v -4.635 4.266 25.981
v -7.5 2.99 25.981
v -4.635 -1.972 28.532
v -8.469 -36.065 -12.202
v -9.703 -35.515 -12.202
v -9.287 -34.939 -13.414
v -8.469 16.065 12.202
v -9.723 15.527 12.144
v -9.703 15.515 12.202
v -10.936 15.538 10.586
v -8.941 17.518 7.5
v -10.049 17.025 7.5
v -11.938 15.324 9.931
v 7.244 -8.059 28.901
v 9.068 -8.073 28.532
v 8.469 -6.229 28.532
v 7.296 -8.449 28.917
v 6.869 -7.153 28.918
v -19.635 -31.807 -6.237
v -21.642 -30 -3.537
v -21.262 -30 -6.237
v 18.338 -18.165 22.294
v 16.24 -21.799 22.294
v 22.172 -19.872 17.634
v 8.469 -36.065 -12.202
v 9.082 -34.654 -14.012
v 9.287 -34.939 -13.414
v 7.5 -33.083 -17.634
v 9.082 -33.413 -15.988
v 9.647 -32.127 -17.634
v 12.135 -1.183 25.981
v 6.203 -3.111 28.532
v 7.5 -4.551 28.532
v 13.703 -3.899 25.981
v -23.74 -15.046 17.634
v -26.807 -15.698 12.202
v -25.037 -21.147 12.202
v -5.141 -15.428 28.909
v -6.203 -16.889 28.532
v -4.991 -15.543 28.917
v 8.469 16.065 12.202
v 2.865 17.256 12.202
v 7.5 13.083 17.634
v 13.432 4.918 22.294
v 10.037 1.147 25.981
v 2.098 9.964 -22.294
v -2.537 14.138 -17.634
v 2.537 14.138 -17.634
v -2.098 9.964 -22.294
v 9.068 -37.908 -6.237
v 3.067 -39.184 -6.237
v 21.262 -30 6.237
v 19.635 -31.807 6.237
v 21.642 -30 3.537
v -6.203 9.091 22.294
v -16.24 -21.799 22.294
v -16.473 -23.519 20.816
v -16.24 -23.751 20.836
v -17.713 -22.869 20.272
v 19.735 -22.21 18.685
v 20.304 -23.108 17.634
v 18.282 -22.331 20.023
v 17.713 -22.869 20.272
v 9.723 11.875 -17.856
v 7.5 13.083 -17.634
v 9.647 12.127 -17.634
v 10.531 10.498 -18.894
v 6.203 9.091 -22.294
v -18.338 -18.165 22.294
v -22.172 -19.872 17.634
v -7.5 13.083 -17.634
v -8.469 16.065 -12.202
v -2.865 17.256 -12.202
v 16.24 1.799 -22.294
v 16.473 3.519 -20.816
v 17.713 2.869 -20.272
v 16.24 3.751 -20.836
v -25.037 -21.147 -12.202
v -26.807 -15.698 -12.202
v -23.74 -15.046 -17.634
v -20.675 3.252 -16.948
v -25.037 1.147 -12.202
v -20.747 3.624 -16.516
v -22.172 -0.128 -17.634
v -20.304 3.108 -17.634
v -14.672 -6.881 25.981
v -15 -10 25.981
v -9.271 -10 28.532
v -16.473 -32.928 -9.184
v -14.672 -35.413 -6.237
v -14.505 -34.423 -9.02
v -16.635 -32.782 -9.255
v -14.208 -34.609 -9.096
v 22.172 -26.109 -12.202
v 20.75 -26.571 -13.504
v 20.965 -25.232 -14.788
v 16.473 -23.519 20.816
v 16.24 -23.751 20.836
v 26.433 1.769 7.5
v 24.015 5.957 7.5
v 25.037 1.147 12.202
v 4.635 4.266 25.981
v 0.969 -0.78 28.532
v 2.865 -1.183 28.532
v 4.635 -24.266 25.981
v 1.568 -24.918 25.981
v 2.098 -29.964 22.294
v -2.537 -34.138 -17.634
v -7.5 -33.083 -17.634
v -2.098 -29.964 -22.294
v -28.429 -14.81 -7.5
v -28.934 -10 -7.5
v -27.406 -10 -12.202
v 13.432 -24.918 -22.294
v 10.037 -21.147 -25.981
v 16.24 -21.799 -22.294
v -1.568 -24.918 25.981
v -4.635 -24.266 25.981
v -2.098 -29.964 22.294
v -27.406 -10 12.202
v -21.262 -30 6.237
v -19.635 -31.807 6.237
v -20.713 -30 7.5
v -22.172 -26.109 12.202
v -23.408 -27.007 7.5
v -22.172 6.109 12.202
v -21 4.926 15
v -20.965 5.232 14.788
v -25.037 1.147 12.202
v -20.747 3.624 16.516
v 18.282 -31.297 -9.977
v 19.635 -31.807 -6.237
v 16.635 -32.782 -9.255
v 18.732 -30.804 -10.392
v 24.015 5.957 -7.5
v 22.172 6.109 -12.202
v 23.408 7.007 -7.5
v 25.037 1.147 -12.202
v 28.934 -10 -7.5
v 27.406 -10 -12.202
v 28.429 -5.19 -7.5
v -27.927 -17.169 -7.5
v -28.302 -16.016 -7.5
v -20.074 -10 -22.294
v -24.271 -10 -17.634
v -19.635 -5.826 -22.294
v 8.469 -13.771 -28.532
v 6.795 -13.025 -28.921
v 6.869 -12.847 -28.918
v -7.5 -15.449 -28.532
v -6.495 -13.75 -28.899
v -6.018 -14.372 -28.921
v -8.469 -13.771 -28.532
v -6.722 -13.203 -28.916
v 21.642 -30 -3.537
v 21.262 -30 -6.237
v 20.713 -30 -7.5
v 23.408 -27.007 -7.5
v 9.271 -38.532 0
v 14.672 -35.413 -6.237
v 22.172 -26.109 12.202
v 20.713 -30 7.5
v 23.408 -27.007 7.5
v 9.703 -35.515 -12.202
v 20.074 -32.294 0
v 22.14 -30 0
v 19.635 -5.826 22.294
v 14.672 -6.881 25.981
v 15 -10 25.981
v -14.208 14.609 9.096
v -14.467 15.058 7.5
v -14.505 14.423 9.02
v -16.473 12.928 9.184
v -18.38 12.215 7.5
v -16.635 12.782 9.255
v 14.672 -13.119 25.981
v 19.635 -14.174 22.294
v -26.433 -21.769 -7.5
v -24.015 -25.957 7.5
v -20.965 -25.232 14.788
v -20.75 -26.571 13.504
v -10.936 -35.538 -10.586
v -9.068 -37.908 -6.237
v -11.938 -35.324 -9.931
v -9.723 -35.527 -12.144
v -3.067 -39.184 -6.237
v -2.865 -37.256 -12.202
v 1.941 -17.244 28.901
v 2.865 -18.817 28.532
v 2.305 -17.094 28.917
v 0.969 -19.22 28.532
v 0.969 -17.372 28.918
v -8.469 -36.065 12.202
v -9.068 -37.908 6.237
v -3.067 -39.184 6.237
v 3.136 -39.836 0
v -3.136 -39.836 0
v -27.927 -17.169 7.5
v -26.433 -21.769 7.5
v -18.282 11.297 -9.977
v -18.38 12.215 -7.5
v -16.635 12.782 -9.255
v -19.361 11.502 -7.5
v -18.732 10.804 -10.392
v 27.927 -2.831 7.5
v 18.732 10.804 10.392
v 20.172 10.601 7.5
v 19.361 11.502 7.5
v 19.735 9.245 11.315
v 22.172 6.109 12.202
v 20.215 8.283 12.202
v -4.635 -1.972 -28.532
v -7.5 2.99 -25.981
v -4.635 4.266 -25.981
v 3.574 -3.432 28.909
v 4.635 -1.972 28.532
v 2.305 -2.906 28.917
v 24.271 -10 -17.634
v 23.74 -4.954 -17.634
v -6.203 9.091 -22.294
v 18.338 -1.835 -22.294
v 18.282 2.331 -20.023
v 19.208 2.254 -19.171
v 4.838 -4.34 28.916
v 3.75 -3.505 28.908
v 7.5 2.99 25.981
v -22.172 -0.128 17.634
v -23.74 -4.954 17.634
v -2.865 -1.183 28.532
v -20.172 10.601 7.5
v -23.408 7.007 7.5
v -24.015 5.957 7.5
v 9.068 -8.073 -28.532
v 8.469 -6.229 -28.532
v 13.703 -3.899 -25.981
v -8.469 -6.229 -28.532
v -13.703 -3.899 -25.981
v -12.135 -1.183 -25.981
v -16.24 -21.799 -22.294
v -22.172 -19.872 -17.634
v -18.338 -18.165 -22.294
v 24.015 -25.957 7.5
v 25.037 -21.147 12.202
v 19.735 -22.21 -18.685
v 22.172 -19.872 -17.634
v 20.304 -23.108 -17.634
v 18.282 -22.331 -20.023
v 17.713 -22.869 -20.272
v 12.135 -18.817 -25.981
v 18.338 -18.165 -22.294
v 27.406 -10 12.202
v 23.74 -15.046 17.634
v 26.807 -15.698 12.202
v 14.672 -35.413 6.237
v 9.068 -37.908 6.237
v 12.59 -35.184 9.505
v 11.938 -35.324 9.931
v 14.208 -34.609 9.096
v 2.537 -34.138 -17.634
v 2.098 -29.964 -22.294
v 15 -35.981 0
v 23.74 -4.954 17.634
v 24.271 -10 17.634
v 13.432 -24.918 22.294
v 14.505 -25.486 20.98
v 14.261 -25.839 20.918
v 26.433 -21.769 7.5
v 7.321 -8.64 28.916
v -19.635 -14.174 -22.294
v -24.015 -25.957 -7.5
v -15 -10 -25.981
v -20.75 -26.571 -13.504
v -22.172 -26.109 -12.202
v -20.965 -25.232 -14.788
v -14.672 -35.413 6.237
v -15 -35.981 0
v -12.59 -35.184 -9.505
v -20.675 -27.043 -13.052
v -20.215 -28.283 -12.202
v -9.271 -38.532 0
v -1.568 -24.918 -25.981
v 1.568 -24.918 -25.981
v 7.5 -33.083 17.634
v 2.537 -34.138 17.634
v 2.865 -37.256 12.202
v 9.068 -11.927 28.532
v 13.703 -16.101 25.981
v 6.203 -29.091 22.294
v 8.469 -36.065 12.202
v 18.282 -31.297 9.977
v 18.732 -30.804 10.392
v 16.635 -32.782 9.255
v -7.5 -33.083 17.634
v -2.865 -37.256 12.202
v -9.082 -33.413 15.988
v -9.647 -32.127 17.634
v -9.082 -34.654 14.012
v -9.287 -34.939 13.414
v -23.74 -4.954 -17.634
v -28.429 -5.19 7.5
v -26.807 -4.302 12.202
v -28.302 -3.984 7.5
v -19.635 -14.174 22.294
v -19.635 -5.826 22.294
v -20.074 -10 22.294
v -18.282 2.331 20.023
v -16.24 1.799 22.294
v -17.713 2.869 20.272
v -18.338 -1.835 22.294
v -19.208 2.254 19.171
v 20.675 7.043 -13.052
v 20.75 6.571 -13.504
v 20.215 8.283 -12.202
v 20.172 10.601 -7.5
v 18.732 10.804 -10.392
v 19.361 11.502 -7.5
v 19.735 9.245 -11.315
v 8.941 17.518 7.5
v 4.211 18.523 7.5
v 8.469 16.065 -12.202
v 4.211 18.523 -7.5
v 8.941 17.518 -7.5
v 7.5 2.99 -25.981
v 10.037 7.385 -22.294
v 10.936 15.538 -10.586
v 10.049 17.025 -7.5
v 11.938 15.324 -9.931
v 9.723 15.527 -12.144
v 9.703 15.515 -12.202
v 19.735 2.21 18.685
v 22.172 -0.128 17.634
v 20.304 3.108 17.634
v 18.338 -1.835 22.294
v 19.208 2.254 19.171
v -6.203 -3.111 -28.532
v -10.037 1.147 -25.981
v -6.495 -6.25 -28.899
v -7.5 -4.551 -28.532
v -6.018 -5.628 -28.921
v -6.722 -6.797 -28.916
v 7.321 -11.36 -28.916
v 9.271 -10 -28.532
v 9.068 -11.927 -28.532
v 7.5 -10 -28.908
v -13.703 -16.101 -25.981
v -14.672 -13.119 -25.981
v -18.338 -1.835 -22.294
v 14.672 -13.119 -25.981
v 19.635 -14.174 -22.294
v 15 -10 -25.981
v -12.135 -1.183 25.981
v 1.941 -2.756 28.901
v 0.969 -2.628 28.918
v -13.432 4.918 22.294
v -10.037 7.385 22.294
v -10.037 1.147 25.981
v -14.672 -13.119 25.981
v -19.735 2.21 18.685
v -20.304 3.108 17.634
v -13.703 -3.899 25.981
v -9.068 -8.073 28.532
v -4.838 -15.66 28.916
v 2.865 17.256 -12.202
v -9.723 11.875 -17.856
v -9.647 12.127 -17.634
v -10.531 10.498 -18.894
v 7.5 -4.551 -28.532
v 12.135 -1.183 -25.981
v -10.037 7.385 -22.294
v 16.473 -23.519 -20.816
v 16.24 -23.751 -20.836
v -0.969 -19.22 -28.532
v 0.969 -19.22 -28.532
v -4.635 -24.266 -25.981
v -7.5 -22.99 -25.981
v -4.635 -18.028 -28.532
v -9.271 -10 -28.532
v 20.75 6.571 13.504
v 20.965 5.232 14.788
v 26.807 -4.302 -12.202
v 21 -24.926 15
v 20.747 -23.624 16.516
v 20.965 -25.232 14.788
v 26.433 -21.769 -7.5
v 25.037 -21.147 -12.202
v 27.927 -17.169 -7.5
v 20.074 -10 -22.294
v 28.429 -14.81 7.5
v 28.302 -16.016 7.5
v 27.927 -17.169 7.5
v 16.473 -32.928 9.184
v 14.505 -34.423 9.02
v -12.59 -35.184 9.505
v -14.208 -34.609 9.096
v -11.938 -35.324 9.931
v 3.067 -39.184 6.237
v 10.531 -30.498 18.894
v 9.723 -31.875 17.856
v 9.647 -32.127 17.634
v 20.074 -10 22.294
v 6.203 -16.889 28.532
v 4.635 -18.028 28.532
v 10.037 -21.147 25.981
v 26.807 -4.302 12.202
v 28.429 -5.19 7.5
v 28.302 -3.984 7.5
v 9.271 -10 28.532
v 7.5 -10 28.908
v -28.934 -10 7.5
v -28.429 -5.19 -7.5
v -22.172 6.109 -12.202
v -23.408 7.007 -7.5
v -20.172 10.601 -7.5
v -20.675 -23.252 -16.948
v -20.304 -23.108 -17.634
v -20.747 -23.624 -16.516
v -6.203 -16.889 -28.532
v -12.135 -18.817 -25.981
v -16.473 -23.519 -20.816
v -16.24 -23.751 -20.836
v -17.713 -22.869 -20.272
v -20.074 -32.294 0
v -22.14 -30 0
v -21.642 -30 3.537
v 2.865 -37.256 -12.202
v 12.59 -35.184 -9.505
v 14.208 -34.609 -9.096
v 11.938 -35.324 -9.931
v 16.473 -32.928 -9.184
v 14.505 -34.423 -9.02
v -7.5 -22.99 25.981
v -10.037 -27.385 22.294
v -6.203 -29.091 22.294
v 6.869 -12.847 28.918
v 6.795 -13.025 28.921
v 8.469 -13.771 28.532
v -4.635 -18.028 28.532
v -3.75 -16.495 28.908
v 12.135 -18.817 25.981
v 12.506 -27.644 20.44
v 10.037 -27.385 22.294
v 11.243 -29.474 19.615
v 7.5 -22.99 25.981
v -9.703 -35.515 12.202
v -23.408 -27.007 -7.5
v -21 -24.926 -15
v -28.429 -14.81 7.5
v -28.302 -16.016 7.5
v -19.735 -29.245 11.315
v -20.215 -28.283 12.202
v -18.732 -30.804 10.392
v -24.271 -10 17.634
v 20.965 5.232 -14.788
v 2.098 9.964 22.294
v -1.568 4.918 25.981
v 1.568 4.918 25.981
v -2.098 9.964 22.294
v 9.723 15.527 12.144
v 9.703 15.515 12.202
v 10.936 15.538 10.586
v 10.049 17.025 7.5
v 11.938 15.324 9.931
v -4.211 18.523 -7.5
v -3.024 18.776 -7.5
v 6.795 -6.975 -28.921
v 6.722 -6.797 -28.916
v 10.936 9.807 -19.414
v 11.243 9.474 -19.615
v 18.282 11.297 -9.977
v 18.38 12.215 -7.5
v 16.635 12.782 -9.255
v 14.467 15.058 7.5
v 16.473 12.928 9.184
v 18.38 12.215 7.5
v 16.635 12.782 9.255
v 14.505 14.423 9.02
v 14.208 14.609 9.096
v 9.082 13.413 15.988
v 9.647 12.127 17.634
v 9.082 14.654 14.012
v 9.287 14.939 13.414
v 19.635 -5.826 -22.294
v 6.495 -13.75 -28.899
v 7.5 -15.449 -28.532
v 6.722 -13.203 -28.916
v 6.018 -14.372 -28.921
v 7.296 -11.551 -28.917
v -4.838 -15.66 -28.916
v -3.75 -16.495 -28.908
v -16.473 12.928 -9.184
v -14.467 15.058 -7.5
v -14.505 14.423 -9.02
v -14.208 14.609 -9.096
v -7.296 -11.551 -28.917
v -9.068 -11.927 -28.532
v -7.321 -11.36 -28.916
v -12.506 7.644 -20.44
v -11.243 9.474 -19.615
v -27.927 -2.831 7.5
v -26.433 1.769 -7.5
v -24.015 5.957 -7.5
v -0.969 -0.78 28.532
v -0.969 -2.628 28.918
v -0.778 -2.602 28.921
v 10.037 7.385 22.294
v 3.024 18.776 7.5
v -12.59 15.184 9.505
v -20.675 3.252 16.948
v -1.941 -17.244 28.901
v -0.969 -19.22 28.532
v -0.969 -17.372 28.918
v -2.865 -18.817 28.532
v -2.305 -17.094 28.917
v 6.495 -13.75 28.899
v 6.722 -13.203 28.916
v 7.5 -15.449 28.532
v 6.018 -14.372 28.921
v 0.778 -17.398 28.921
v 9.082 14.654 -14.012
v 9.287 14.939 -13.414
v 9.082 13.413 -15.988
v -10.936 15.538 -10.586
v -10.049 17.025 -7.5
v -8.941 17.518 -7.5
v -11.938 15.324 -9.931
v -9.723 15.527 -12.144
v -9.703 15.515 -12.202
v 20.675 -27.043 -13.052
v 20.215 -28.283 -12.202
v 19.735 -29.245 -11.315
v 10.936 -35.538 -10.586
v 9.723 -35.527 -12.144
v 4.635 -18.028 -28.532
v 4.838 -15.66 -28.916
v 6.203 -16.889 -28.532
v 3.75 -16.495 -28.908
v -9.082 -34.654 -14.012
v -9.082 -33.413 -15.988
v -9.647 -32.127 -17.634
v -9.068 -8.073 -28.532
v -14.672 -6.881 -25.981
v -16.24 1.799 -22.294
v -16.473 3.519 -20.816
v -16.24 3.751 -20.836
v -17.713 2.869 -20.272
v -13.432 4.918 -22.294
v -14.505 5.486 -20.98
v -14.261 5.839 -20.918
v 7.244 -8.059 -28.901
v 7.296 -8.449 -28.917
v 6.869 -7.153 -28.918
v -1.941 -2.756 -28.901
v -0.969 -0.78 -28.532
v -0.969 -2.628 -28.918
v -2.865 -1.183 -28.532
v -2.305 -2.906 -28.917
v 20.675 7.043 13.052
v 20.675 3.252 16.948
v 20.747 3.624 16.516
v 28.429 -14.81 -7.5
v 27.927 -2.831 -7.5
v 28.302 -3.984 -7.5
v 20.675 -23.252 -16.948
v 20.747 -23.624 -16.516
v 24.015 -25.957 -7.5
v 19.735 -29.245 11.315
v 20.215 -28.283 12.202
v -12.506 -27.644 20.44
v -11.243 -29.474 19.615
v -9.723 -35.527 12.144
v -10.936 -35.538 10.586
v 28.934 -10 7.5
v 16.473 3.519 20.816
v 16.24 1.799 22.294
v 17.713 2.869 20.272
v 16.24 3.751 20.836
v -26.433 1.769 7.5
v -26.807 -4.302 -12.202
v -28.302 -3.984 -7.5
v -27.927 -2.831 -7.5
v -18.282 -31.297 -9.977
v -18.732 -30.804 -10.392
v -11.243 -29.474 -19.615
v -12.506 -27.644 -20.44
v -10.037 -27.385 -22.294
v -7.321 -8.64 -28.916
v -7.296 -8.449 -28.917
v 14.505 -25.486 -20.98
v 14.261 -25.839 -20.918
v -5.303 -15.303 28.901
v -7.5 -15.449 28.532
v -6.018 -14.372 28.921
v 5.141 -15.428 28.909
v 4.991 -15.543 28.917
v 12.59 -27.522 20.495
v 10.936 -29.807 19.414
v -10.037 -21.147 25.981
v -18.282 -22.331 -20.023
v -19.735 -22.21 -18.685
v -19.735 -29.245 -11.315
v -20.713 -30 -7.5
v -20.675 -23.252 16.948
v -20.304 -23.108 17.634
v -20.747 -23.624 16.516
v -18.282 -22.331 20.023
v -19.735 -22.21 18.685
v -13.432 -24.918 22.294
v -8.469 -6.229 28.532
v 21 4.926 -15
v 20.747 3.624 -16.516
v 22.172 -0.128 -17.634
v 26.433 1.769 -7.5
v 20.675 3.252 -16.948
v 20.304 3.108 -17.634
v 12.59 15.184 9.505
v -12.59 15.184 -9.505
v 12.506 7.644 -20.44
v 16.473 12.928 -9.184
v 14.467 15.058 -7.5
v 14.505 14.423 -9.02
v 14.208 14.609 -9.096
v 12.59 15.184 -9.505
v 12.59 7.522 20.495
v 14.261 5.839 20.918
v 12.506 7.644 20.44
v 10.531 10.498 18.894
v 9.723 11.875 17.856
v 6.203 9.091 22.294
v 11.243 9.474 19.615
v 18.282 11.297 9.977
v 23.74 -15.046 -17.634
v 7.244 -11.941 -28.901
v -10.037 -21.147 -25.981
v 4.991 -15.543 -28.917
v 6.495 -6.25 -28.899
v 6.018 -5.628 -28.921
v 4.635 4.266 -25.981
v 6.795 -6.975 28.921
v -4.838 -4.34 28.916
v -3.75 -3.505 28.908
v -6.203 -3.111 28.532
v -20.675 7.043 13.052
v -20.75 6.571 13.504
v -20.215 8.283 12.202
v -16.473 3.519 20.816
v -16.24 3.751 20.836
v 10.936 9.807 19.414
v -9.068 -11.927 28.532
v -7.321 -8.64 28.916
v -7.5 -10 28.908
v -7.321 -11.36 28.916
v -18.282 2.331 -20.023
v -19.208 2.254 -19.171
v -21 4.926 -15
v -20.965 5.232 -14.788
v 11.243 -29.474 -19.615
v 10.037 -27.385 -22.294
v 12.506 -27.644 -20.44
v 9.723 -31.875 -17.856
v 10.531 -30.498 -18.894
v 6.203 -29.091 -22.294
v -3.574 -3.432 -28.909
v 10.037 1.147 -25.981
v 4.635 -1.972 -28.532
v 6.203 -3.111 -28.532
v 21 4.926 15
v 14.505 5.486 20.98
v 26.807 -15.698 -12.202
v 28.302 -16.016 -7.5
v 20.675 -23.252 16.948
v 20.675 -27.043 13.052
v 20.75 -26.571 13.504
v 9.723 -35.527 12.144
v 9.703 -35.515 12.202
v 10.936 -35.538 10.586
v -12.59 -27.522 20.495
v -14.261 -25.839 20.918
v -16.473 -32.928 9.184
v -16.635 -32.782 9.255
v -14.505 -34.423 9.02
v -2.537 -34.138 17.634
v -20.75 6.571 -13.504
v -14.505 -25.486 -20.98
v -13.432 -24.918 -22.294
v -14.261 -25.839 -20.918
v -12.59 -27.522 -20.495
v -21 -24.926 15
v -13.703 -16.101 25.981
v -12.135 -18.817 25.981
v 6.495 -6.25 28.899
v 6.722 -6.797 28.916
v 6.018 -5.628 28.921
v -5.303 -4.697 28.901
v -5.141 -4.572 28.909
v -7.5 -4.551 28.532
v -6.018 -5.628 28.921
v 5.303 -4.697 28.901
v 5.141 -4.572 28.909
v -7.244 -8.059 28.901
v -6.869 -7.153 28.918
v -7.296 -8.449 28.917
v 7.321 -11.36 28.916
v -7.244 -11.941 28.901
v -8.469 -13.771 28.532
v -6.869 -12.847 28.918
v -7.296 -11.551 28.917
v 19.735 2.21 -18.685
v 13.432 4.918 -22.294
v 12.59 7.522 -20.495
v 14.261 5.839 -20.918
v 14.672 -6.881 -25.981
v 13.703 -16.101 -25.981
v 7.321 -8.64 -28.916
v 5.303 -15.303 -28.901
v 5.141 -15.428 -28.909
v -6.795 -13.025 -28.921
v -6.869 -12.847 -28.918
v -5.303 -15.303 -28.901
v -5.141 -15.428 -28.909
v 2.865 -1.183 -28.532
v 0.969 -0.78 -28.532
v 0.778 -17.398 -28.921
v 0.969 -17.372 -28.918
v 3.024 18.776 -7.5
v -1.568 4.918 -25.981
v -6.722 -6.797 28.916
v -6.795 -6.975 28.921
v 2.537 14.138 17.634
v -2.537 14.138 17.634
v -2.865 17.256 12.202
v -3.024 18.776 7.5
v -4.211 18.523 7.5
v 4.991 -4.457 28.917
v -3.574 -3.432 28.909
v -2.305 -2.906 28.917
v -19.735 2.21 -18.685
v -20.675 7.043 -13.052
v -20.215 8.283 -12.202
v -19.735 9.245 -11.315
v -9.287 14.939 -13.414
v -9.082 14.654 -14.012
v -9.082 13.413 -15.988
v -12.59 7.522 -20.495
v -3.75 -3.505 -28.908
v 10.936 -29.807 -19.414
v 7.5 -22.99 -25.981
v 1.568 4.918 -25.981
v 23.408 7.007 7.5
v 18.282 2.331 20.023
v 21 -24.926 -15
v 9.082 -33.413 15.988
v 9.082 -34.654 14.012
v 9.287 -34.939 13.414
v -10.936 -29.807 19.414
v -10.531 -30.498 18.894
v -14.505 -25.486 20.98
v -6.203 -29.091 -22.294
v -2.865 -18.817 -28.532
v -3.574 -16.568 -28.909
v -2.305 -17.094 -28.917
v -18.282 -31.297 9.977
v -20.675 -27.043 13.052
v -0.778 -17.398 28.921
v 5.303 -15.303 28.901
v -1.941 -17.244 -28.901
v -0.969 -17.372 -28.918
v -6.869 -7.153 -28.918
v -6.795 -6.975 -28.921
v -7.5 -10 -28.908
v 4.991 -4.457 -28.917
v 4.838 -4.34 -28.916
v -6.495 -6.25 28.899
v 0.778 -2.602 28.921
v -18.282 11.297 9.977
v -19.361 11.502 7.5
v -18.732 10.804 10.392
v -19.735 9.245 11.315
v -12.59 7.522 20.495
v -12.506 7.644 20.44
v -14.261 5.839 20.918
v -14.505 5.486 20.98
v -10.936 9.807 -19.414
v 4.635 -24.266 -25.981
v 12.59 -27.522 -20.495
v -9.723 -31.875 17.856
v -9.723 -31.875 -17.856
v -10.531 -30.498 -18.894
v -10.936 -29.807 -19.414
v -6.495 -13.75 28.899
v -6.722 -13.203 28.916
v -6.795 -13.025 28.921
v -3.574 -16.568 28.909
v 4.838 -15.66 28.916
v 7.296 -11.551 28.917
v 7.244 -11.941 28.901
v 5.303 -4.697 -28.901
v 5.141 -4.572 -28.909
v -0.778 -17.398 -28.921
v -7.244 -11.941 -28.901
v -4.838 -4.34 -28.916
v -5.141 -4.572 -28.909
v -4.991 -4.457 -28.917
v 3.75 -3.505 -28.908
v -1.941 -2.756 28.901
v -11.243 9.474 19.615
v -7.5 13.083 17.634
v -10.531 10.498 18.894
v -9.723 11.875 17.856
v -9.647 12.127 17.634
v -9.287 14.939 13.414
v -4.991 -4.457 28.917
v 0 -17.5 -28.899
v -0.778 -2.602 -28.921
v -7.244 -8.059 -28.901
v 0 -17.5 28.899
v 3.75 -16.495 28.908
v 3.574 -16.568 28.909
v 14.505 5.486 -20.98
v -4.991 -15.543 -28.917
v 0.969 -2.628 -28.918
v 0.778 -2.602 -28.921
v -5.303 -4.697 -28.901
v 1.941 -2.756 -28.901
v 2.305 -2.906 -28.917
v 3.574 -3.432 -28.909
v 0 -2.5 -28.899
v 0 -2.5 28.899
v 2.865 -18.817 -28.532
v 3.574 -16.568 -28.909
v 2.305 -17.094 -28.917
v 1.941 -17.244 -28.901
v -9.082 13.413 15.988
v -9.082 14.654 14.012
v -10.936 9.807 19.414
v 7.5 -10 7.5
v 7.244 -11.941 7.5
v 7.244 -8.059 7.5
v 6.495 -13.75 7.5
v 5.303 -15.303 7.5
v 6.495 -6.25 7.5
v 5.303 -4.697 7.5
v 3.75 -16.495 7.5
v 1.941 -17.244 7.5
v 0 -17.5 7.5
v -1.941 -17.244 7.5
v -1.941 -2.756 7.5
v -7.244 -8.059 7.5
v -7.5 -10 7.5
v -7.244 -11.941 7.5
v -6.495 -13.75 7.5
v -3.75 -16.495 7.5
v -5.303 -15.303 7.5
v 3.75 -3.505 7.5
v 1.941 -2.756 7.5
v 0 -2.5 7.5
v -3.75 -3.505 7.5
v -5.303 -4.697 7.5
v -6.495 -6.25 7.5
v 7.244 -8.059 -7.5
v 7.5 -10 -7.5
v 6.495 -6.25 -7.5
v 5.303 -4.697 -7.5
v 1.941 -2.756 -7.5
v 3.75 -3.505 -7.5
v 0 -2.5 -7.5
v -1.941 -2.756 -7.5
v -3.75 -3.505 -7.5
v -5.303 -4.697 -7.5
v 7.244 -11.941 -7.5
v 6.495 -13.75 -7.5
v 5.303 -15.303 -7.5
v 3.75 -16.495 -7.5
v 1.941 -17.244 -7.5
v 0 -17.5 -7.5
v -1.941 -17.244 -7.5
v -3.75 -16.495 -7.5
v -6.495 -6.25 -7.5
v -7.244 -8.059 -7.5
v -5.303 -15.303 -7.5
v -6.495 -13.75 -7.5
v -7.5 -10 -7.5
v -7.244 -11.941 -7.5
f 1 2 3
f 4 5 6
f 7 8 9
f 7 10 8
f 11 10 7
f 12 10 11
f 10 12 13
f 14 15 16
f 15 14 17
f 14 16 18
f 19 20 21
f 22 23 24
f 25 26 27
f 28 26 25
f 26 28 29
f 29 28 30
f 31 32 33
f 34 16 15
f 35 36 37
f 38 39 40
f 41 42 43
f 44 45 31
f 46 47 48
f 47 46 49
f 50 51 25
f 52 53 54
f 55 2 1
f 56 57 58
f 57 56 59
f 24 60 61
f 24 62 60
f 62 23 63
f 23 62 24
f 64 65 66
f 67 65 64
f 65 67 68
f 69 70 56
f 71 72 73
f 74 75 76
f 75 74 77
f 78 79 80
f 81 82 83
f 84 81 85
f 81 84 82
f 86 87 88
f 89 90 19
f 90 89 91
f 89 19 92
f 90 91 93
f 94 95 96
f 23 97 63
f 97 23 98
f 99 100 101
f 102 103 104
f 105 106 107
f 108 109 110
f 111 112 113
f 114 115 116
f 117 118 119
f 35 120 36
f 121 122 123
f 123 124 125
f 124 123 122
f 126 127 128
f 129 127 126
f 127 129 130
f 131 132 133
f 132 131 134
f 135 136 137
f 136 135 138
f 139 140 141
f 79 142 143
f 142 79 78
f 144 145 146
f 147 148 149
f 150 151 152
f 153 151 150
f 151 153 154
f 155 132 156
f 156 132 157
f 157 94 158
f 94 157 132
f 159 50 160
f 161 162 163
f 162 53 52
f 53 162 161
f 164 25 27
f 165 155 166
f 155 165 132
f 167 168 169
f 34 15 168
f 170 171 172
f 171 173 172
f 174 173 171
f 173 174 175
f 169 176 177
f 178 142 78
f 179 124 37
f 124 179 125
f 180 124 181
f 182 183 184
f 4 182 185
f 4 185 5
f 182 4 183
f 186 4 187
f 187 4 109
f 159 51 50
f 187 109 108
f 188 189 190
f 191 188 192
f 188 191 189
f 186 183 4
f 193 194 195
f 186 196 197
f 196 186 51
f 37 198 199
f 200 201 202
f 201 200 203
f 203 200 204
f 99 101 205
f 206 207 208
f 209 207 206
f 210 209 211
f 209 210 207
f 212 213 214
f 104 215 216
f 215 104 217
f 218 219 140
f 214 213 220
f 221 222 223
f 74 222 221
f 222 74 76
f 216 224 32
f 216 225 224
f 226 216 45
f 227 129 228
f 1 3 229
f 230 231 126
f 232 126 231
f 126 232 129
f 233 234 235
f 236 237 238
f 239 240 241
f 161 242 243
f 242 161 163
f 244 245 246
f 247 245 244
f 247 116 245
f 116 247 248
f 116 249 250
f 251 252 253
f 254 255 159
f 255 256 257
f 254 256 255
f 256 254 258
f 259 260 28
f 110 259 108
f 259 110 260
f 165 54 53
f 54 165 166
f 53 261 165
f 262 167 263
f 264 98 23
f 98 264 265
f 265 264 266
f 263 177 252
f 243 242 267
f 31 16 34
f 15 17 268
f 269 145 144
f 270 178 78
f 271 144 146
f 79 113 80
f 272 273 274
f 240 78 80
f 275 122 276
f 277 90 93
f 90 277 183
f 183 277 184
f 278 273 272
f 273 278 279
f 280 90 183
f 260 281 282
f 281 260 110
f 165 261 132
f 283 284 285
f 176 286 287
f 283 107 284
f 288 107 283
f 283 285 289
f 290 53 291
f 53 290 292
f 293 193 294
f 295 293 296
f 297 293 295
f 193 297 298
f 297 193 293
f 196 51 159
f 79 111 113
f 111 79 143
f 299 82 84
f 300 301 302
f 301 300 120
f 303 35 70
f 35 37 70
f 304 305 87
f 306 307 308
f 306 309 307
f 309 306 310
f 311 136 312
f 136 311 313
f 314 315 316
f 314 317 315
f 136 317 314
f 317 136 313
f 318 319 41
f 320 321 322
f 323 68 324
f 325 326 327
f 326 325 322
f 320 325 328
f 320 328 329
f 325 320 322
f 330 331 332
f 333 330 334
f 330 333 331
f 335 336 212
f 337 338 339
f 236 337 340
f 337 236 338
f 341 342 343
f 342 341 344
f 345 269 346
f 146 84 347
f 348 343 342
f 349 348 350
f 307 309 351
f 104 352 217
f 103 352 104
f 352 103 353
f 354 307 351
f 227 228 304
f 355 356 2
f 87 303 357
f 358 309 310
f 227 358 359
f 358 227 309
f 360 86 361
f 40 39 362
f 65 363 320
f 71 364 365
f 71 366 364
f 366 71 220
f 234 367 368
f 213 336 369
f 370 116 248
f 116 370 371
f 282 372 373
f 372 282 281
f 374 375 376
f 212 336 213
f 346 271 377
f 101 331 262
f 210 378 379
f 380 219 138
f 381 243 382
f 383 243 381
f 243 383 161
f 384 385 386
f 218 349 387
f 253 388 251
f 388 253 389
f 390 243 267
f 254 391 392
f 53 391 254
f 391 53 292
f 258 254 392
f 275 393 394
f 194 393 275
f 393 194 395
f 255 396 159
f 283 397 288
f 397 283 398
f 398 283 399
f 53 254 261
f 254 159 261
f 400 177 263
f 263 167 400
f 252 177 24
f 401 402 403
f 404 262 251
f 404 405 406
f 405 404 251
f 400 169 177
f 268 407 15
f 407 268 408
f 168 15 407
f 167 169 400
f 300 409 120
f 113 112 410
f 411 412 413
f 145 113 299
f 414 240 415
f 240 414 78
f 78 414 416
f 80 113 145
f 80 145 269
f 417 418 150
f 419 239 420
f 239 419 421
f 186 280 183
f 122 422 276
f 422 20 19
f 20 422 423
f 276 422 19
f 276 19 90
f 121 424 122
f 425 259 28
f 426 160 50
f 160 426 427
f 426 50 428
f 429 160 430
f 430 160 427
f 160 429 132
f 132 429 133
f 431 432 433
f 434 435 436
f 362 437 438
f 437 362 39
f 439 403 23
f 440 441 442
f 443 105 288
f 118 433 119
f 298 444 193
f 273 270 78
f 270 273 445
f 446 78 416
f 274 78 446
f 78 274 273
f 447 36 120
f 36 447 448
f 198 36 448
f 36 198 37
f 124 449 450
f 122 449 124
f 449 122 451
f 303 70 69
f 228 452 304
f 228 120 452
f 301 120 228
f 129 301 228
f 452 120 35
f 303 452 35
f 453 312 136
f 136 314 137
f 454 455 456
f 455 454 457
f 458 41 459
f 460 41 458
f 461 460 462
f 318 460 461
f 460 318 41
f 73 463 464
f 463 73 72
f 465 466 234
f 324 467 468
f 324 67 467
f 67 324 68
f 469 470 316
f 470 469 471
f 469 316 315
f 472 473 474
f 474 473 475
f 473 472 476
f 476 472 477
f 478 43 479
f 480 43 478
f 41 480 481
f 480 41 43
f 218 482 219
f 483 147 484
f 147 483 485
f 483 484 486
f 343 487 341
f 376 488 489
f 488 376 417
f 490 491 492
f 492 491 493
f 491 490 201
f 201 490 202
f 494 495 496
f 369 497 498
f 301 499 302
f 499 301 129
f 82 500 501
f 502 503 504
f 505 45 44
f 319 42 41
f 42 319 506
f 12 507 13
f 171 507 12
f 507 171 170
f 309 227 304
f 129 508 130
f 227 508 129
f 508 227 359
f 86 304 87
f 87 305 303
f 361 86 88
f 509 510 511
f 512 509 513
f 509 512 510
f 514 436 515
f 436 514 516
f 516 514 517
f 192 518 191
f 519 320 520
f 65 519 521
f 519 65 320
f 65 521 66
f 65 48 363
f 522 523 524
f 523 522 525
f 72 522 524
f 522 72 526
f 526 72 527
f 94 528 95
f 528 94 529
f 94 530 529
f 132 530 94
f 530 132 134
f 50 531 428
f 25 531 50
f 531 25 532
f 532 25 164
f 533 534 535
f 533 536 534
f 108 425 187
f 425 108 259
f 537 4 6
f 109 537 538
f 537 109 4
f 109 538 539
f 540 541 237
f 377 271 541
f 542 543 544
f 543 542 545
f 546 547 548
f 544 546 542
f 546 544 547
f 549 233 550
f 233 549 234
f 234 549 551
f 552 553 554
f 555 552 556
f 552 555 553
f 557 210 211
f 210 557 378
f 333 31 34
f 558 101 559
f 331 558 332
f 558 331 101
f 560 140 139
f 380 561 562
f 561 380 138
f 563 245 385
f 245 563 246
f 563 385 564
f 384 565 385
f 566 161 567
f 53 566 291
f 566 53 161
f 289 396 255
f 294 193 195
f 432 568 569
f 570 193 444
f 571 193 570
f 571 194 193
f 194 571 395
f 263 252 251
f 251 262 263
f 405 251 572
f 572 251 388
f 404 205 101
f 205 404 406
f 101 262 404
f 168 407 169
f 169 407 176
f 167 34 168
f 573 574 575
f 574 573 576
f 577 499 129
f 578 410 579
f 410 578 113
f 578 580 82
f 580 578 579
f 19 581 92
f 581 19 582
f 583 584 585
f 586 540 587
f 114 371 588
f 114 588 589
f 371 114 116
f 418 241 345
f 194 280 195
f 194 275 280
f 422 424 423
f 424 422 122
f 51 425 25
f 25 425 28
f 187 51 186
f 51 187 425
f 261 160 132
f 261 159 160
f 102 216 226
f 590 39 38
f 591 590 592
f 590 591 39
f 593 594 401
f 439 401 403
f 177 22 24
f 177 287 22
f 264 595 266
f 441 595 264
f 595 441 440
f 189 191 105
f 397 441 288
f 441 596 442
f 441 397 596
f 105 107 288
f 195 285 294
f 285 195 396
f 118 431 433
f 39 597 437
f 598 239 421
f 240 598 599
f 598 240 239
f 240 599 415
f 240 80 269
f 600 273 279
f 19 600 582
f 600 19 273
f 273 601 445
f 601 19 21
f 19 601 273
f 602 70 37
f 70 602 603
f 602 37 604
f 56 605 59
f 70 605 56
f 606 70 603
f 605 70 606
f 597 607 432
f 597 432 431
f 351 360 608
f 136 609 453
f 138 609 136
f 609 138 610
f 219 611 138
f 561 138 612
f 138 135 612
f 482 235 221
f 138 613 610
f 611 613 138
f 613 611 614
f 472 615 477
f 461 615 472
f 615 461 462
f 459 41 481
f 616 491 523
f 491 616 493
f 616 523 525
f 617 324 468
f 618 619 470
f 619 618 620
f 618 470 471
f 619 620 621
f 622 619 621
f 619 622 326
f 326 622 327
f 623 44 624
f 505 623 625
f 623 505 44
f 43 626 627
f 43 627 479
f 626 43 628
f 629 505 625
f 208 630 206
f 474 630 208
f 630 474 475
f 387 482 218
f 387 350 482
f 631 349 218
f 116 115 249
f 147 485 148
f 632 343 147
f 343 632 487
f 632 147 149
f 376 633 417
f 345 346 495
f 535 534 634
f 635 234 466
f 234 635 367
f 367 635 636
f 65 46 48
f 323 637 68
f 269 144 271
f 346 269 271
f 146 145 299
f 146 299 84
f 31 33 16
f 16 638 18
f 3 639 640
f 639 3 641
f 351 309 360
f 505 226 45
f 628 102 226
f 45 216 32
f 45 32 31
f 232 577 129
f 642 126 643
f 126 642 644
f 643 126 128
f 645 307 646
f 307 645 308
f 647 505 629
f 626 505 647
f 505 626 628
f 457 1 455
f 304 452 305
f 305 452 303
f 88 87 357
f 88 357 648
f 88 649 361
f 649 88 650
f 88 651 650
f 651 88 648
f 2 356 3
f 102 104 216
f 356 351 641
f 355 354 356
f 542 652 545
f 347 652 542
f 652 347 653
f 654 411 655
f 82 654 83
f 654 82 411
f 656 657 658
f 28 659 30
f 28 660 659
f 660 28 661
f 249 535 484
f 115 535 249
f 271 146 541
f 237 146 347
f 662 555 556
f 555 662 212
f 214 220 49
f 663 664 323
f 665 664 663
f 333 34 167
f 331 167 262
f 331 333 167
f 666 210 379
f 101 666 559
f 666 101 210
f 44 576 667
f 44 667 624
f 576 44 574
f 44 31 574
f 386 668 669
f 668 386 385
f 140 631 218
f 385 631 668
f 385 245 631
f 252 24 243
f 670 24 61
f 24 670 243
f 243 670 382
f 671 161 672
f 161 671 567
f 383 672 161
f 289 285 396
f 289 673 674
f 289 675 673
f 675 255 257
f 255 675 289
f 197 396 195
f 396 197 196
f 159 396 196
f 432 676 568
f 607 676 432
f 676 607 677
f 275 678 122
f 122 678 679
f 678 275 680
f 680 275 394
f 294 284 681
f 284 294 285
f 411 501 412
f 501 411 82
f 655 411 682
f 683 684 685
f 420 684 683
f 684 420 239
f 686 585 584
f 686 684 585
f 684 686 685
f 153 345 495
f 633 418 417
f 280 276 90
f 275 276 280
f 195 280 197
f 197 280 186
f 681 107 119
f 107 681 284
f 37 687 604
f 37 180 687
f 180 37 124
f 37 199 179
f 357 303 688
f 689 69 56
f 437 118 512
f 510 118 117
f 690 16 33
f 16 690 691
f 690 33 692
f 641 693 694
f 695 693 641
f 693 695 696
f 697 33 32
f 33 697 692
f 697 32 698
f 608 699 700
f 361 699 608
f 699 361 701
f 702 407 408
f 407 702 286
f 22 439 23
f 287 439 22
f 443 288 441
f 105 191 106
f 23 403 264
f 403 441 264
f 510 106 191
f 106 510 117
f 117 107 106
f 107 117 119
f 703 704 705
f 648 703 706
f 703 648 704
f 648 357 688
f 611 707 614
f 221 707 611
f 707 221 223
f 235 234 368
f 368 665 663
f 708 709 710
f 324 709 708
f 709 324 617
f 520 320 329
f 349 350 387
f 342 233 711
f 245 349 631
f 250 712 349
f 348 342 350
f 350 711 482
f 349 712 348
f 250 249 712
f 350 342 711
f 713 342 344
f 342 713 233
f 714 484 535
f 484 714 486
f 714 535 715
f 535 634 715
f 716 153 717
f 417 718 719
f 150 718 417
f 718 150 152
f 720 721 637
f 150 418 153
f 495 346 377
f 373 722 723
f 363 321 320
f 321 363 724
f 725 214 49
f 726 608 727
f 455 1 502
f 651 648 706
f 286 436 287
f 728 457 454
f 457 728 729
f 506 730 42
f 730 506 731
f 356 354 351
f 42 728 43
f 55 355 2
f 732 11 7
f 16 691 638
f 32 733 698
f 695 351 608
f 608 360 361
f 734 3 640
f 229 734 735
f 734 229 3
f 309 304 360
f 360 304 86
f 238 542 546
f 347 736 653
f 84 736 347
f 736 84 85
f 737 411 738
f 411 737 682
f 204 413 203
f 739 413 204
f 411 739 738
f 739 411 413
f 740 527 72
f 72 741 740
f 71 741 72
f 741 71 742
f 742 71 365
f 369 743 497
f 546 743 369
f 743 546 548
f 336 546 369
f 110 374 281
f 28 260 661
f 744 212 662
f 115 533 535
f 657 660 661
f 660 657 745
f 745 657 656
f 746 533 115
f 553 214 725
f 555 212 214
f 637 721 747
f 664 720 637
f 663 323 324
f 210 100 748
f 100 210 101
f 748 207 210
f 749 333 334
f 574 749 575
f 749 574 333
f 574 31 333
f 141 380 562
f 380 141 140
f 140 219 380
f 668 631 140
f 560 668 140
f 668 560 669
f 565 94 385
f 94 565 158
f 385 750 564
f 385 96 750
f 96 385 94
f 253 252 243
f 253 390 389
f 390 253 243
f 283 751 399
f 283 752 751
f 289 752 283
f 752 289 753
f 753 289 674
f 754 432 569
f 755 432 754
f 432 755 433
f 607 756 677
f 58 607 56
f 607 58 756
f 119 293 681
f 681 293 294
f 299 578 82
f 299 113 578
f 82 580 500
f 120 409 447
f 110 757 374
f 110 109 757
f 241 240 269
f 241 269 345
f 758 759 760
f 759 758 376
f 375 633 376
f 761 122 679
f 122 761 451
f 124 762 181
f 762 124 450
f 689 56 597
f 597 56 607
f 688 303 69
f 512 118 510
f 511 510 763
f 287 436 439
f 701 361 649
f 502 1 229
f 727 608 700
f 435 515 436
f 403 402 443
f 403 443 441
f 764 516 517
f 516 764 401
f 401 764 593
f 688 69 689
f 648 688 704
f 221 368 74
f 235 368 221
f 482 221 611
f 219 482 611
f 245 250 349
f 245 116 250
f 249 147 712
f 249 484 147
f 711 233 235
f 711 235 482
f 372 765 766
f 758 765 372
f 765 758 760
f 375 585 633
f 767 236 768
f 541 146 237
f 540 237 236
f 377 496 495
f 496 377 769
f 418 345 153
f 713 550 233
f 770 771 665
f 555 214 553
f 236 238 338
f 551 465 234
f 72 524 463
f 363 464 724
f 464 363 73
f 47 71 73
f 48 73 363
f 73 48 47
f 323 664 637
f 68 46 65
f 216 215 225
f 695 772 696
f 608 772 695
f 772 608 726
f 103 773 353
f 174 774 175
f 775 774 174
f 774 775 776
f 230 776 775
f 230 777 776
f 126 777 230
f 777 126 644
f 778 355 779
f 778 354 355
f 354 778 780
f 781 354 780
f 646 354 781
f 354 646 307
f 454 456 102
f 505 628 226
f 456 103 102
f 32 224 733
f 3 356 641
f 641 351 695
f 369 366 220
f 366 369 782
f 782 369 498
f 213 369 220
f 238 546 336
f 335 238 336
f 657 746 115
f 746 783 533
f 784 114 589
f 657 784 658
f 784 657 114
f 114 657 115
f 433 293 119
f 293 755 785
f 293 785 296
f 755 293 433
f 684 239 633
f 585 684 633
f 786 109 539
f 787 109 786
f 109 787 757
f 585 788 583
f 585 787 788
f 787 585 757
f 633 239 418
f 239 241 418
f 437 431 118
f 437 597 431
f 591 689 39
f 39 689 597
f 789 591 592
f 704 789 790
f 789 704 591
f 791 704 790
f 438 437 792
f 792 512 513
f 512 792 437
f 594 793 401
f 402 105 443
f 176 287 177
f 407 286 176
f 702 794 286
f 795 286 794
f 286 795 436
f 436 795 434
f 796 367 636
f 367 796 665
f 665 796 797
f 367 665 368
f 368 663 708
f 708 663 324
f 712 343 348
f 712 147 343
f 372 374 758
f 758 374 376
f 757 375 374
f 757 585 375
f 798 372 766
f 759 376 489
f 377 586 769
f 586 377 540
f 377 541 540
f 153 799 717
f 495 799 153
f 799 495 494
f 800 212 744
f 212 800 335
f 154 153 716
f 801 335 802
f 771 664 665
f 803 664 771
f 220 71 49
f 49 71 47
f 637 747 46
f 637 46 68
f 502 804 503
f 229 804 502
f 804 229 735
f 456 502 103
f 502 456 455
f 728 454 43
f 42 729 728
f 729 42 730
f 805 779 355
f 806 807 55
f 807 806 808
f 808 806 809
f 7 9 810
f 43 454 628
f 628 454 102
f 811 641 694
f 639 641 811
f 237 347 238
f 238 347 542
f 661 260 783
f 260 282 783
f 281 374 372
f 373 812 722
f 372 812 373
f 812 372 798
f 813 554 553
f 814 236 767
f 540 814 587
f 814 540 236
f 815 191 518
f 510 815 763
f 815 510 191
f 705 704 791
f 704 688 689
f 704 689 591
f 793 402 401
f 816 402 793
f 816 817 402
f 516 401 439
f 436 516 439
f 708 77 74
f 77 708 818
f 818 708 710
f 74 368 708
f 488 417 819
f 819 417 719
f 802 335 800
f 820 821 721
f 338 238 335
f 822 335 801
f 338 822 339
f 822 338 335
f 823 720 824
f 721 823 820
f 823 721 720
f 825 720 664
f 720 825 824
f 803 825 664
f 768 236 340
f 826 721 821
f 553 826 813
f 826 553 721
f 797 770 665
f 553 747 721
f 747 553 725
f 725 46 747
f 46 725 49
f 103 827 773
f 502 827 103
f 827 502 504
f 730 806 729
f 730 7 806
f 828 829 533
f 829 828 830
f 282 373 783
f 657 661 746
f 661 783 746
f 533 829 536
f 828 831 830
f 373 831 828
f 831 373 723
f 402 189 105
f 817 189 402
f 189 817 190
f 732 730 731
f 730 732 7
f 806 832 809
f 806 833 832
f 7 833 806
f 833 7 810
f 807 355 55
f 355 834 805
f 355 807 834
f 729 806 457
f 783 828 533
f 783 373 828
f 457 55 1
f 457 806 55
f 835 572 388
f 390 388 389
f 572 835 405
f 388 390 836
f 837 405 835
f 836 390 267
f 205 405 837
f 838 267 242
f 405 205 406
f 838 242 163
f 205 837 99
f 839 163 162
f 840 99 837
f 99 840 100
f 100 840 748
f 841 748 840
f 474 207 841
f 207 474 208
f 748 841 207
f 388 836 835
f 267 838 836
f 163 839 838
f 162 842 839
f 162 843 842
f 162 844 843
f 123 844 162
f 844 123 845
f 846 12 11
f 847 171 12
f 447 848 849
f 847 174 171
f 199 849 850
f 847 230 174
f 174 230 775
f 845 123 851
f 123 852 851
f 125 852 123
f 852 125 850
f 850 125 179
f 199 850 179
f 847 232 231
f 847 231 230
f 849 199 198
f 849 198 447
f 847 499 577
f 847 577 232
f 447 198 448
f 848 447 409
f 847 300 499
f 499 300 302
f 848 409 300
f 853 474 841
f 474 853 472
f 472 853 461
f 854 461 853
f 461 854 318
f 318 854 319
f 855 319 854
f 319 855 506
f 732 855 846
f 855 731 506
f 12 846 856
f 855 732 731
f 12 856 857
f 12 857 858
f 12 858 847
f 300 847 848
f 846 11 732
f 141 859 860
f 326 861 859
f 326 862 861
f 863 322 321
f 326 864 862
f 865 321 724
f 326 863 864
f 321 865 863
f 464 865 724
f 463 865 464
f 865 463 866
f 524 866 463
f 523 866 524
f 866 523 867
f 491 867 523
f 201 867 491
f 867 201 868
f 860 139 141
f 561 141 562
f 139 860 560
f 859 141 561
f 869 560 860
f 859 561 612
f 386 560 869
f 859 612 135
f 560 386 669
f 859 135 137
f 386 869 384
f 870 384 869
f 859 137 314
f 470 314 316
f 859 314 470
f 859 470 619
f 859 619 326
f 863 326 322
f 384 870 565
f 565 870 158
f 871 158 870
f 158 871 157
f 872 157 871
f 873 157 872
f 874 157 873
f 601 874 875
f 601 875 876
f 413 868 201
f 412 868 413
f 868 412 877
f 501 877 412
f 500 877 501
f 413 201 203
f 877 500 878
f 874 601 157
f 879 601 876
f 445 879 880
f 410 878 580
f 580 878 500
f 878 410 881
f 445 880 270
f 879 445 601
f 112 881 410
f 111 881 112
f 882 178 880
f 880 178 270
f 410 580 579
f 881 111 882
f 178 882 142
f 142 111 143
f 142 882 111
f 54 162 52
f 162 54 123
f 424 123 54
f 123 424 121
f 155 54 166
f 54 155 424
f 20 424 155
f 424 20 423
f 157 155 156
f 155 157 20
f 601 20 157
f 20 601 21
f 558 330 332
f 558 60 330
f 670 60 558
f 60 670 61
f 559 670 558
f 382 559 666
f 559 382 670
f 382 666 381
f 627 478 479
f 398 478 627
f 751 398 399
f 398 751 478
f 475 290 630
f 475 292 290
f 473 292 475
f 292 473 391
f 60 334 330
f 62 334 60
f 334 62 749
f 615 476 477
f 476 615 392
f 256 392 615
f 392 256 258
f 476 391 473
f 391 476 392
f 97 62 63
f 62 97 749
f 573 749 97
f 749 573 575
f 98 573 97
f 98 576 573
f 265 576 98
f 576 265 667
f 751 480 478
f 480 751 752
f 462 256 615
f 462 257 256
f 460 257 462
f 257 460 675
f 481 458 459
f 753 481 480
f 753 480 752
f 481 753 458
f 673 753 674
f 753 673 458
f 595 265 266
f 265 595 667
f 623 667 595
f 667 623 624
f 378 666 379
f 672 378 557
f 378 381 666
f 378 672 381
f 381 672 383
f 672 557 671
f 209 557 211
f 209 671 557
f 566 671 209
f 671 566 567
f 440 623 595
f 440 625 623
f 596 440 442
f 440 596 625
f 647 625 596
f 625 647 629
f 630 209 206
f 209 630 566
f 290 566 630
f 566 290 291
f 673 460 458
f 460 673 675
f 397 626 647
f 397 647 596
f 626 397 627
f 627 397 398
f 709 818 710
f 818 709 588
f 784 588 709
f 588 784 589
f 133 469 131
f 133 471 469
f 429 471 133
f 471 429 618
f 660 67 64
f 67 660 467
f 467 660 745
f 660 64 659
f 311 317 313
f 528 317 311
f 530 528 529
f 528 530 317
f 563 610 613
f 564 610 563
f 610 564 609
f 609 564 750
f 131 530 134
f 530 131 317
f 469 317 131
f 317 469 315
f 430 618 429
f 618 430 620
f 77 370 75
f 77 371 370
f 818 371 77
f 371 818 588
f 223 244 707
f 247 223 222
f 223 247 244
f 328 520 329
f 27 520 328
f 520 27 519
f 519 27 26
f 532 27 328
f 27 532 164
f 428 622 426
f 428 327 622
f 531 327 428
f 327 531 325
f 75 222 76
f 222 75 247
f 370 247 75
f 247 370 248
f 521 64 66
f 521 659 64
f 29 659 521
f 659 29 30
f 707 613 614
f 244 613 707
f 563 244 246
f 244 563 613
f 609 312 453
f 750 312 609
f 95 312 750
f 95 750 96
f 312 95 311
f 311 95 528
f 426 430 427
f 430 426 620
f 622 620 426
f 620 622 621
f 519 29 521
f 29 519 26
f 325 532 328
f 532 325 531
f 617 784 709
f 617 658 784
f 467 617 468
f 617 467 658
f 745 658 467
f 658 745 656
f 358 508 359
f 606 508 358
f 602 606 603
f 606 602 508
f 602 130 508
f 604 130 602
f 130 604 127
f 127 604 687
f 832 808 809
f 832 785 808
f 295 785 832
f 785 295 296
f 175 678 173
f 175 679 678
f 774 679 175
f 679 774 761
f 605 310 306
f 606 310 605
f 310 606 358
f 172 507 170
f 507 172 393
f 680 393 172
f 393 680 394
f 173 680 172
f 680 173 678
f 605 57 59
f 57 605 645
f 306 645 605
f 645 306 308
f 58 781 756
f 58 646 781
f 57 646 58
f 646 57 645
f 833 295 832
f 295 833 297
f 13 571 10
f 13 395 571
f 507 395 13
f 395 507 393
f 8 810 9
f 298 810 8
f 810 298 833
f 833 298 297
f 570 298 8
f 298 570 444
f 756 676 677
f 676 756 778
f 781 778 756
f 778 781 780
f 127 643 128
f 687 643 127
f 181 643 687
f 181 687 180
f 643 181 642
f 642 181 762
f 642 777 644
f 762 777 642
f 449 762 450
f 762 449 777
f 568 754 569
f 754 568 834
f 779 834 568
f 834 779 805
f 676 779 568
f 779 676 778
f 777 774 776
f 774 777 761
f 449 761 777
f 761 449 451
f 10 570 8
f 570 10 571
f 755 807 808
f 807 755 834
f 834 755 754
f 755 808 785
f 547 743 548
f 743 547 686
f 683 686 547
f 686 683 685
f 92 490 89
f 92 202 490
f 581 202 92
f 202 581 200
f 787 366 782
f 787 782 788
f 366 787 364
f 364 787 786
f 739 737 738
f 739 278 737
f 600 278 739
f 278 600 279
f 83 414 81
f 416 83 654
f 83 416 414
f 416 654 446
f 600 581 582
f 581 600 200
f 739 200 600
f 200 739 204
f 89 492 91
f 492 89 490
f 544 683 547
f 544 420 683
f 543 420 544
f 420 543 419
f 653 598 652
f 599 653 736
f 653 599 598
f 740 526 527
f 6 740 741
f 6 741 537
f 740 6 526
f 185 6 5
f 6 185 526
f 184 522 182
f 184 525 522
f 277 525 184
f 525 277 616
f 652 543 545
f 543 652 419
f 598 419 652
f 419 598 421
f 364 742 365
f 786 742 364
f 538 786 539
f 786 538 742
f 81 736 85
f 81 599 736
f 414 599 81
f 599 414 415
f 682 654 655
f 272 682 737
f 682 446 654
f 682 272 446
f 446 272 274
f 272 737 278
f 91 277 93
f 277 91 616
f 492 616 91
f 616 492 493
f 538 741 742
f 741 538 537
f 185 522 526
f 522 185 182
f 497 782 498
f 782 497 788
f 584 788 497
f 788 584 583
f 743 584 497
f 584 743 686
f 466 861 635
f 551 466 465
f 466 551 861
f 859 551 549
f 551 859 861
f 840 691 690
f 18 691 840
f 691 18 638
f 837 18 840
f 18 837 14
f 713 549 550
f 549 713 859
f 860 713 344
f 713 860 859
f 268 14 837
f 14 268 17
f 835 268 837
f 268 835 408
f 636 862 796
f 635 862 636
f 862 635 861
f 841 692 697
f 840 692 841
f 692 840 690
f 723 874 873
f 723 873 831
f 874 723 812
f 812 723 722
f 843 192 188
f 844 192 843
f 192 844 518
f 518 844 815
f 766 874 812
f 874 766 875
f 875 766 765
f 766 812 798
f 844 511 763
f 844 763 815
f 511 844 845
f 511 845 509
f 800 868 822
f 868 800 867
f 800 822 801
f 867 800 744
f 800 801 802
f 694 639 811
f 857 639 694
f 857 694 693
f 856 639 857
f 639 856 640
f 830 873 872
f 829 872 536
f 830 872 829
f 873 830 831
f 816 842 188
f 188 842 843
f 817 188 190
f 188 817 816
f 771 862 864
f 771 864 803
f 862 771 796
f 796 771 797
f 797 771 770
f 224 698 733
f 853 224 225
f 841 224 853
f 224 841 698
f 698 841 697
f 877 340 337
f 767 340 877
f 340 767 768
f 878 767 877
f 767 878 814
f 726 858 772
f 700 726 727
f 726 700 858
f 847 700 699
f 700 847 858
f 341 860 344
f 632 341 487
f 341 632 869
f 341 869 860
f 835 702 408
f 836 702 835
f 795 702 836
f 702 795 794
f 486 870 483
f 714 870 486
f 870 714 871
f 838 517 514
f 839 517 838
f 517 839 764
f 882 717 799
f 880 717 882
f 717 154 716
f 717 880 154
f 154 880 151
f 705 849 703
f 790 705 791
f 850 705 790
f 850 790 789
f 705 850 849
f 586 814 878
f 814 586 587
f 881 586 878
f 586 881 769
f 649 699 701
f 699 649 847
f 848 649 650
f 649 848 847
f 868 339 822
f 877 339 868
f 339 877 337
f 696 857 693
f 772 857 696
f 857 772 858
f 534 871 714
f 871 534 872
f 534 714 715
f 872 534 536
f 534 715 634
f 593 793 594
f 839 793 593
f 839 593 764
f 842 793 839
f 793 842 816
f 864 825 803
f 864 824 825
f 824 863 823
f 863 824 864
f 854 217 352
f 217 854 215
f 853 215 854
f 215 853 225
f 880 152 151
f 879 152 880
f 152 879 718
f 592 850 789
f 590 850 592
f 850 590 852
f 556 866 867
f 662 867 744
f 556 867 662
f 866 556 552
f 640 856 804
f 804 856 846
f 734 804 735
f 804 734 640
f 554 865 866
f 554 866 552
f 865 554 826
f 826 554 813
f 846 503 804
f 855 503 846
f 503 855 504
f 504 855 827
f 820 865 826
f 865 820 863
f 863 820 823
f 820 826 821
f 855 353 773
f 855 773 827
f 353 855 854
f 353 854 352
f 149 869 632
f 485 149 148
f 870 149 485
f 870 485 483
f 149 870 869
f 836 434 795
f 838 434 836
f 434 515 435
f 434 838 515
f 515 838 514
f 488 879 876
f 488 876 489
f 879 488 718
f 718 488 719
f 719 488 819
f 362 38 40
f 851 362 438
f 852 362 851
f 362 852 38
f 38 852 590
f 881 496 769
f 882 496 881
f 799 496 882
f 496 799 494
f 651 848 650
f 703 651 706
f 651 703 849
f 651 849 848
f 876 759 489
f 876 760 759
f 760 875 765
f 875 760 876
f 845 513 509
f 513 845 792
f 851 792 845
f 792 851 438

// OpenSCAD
TABLE_LENGTH = 15;
KNOB_RADIUS = 2 * TABLE_LENGTH;
OFFSET = -10;

module mirror_copy(v = [1, 0, 0]) {
    children();
    mirror(v) children();
}

module knob() {
    difference() {
        difference() {
            translate([0,OFFSET,0])
            sphere(KNOB_RADIUS);
            scale([4,4,1])
            cube(TABLE_LENGTH,center=true);
        }
        VERTICAL_HOLE_RADIUS = 7.5;
        VERTICAL_HOLE_HEIGHT = 80;
        HORIZONTAL_HOLE_RADIUS = VERTICAL_HOLE_RADIUS * 0.8;
        HORIZONTAL_HOLE_HEIGHT = VERTICAL_HOLE_HEIGHT;
        translate([0,OFFSET,-VERTICAL_HOLE_HEIGHT / 2])
        cylinder(r=VERTICAL_HOLE_RADIUS, h=VERTICAL_HOLE_HEIGHT);
        // holes
        mirror_copy([1,0,0])
        mirror_copy([0,0,1])
        rotate([90,0,0])
        translate([0.5 * KNOB_RADIUS, 0.5 * KNOB_RADIUS,-HORIZONTAL_HOLE_HEIGHT / 2])
        cylinder(r=HORIZONTAL_HOLE_RADIUS, h=HORIZONTAL_HOLE_HEIGHT);
    }
}
knob();

// todo add hook for headphone
// todo think about making this "generic" different bit and bobs to slid in and out of these knobs for different kinds of storage
